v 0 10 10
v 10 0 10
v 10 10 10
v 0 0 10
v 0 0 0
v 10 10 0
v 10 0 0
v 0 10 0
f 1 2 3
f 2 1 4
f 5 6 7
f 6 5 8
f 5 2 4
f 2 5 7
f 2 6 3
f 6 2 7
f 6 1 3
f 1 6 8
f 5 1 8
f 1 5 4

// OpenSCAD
// A 2D top-level object is skipped (status skipped-2d), not treated as a part.
cube(10);
square(20);
